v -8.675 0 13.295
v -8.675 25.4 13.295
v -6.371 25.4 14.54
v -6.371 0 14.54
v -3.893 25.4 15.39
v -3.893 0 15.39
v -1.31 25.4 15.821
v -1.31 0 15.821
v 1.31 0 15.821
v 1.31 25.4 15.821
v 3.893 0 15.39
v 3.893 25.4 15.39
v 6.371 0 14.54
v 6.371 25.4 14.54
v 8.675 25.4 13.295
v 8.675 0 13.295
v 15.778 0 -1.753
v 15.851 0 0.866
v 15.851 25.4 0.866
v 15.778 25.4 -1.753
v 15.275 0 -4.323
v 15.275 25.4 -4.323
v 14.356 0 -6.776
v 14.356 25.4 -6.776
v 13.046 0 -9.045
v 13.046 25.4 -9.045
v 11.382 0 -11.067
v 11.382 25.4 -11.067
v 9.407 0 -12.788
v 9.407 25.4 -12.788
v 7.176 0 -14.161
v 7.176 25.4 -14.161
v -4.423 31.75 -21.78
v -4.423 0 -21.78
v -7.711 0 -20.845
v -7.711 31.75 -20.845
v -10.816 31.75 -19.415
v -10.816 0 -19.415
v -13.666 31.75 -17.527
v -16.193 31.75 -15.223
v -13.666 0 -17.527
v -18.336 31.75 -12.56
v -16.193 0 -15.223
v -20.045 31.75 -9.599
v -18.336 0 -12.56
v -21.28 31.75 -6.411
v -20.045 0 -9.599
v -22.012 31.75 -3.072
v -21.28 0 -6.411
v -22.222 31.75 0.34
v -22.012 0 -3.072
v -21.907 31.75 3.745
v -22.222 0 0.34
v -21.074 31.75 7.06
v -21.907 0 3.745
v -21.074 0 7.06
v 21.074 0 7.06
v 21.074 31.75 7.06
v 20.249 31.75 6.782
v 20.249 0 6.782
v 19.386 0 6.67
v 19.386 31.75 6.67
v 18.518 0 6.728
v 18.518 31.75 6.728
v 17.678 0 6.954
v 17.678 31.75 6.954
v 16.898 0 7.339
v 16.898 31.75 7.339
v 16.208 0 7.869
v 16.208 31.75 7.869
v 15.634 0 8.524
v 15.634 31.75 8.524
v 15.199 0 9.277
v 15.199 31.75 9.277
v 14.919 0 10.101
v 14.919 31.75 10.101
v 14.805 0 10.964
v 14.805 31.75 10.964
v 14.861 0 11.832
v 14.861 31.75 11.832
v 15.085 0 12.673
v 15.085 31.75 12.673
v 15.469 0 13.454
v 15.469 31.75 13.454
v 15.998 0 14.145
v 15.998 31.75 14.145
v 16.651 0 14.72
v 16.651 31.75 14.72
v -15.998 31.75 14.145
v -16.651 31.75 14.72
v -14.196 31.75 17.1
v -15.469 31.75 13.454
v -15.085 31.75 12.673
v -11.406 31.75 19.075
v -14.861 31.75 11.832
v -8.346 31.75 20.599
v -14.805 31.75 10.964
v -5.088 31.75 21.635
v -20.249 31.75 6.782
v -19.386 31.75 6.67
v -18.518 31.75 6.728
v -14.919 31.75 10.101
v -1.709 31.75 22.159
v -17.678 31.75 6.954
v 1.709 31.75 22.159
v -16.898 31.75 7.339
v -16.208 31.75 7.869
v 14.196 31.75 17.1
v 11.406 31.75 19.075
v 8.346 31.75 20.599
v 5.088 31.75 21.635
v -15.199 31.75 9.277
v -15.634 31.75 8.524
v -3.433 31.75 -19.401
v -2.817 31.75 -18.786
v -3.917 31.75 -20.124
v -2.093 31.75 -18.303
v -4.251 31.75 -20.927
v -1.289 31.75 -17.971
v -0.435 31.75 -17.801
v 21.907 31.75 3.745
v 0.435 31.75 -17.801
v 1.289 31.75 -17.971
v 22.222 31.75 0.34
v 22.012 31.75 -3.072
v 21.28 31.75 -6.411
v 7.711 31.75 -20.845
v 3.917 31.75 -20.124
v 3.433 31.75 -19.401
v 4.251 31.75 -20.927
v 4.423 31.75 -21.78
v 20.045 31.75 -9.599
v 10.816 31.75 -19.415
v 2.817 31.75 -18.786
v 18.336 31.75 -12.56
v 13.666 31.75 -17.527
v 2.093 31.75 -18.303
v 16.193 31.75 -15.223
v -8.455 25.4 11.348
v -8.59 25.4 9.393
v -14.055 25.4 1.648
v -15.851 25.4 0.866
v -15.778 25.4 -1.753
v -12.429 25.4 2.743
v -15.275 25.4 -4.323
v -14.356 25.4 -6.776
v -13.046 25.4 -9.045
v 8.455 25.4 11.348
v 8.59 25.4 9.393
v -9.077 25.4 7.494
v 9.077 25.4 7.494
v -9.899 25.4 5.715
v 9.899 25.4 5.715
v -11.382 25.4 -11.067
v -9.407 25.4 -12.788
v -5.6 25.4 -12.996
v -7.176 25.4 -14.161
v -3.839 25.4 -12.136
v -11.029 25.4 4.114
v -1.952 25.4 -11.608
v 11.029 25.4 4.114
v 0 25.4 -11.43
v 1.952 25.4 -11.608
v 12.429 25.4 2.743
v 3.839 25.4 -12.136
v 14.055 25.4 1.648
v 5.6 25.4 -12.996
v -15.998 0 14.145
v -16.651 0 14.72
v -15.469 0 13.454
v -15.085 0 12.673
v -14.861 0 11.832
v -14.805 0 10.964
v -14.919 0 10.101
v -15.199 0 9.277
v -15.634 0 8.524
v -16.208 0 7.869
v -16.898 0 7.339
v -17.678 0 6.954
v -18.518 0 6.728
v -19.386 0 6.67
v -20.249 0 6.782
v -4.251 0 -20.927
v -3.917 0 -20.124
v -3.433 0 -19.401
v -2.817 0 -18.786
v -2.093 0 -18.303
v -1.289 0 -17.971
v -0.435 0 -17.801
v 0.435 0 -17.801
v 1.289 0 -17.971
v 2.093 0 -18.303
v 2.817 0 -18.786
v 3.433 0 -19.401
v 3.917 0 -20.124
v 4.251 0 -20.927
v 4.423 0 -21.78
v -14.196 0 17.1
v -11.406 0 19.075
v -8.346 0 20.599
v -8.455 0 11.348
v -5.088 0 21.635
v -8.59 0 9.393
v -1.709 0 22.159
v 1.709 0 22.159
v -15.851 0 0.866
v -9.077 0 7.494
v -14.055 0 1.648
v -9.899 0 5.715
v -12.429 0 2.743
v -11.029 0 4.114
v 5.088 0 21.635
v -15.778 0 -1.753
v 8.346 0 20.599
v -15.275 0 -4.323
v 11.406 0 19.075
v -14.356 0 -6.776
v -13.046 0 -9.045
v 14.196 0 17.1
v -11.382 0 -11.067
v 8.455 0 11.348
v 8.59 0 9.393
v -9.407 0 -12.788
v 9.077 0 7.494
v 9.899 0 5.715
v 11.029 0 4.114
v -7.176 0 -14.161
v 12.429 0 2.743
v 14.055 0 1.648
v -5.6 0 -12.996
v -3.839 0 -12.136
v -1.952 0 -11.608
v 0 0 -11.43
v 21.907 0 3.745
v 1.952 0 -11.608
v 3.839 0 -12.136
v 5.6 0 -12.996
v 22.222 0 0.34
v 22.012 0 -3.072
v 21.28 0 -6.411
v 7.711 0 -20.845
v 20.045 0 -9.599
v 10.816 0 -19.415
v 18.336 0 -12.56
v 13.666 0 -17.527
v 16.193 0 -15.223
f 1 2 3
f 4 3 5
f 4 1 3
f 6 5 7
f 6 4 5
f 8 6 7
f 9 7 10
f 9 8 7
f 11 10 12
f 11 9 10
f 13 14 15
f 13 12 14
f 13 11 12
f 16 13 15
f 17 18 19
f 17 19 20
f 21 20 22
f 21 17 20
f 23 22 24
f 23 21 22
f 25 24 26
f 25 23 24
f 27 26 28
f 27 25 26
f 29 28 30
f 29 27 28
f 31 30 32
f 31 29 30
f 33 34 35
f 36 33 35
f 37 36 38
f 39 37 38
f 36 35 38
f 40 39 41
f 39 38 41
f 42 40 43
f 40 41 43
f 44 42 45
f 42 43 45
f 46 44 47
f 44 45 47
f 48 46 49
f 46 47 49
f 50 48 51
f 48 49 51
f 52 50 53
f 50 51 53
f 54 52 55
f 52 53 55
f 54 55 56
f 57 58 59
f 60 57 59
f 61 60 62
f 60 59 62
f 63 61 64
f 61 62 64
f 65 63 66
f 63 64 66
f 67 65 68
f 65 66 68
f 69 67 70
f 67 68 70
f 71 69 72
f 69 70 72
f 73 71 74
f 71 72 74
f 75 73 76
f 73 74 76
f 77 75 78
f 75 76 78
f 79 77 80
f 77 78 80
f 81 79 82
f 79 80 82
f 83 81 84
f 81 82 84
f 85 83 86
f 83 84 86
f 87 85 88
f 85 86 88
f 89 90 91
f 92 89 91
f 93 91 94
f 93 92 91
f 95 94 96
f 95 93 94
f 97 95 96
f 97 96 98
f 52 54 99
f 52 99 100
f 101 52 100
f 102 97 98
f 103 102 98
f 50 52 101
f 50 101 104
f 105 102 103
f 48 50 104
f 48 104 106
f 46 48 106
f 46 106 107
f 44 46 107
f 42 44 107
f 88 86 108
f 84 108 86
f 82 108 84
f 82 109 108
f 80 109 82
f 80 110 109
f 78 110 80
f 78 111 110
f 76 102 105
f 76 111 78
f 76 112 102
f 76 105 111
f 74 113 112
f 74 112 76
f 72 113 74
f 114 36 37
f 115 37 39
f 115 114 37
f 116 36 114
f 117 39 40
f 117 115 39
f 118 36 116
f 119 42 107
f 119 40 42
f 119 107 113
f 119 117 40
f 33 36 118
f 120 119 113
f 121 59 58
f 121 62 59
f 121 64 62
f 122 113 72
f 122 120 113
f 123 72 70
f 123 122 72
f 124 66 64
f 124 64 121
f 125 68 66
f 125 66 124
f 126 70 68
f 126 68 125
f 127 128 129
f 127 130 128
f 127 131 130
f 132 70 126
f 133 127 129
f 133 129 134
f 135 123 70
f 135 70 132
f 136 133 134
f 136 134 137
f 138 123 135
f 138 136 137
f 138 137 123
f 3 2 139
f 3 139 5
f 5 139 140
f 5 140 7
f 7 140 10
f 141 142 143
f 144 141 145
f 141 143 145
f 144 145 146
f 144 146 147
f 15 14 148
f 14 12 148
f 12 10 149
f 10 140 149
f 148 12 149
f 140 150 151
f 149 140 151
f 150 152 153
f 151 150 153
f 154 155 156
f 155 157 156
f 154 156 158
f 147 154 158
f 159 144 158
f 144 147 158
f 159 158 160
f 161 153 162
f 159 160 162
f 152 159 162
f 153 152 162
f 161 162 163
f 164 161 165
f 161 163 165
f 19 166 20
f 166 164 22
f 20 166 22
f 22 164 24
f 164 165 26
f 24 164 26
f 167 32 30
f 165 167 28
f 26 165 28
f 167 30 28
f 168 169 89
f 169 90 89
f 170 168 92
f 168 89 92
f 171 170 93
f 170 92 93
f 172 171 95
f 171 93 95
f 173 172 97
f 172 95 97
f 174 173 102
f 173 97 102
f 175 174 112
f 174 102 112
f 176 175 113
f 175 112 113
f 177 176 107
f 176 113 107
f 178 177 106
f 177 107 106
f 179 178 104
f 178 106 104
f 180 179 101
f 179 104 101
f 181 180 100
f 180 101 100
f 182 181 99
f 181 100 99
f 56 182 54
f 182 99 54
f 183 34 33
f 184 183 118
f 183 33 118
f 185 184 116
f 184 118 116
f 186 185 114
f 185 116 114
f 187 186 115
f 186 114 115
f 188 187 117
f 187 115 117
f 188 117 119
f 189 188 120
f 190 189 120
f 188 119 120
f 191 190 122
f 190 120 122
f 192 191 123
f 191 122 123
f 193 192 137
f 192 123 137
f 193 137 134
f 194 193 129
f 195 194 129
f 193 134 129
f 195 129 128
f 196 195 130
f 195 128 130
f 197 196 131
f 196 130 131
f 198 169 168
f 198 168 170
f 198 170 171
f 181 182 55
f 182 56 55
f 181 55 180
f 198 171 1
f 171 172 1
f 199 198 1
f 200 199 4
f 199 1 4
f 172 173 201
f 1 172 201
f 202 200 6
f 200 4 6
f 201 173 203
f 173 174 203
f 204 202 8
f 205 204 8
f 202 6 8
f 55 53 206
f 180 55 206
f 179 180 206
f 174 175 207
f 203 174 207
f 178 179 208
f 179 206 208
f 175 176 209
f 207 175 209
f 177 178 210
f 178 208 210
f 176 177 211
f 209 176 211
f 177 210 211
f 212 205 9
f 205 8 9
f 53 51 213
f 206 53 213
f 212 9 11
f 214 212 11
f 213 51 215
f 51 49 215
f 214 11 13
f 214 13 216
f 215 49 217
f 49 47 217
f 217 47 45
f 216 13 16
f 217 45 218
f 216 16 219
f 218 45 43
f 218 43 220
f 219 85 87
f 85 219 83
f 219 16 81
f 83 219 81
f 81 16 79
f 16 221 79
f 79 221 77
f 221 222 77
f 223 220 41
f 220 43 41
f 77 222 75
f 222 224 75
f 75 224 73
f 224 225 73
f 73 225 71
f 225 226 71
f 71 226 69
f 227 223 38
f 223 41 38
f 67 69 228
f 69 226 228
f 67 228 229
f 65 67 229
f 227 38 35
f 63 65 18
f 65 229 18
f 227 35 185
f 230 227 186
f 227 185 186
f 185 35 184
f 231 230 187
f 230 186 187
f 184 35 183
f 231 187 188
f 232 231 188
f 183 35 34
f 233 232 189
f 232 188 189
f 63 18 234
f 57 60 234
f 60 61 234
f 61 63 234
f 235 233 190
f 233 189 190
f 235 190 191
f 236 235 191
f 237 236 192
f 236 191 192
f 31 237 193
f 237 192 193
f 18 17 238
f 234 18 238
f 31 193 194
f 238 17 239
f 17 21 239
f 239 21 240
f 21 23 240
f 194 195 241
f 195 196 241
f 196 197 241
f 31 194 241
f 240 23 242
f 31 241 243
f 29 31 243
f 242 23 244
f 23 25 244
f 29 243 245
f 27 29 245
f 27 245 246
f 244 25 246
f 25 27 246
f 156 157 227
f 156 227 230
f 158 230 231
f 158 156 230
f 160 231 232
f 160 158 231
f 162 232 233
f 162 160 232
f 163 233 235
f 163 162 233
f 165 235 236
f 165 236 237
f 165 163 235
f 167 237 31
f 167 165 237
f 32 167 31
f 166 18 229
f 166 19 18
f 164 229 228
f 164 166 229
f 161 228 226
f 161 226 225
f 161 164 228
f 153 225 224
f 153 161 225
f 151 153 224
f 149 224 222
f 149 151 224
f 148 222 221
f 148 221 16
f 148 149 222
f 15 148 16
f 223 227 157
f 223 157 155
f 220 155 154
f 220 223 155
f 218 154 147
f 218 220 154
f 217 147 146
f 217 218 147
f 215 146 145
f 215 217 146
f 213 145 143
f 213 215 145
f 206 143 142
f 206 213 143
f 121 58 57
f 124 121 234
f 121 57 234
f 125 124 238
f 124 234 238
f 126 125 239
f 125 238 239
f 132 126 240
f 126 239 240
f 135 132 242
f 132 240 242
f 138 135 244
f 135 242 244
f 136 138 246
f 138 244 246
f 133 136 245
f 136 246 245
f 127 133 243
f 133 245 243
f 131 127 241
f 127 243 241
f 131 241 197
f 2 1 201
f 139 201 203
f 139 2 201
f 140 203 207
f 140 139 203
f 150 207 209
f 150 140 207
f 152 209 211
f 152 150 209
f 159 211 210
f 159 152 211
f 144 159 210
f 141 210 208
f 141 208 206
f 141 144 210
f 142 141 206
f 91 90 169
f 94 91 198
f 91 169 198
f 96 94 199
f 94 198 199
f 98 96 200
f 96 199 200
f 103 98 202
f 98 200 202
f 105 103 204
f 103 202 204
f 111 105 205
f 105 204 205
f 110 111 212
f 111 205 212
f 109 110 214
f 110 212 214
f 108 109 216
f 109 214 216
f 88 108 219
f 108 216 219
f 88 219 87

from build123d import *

# Parameters (mm, degrees)
CROQUIS1_R              = 22.225
SALIENTE_EXTRUIR1_DEPTH = 31.75
CROQUIS2_R              = 4.445
CORTAR_EXTRUIR1_DEPTH   = 32.75
VACIADO1_T              = -6.35


with BuildPart() as part:
    # Croquis1 → Saliente-Extruir1 (new body)
    with BuildSketch(Plane(origin=(0, 0, 0), x_dir=(1, 0, 0), z_dir=(0, 1, 0))):
        Circle(CROQUIS1_R)
    extrude(amount=SALIENTE_EXTRUIR1_DEPTH)

    # Croquis2 → Cortar-Extruir1 (cut, through all)
    with BuildSketch(Plane(origin=(0, 31.75, 0), x_dir=(1, 0, 0), z_dir=(0, 1, 0))):
        with Locations((0, 22.225)):
            Circle(CROQUIS2_R)
        with Locations((19.247414599, -11.1125)):
            Circle(CROQUIS2_R)
        with Locations((-19.247414599, -11.1125)):
            Circle(CROQUIS2_R)
    extrude(amount=-CORTAR_EXTRUIR1_DEPTH, mode=Mode.SUBTRACT)

    # Vaciado1
    vaciado1_openings = [part.faces().sort_by_distance(p)[0] for p in [
        (0, 0, 0),
    ]]
    offset(amount=VACIADO1_T, openings=vaciado1_openings, kind=Kind.INTERSECTION)


solid = part.part
